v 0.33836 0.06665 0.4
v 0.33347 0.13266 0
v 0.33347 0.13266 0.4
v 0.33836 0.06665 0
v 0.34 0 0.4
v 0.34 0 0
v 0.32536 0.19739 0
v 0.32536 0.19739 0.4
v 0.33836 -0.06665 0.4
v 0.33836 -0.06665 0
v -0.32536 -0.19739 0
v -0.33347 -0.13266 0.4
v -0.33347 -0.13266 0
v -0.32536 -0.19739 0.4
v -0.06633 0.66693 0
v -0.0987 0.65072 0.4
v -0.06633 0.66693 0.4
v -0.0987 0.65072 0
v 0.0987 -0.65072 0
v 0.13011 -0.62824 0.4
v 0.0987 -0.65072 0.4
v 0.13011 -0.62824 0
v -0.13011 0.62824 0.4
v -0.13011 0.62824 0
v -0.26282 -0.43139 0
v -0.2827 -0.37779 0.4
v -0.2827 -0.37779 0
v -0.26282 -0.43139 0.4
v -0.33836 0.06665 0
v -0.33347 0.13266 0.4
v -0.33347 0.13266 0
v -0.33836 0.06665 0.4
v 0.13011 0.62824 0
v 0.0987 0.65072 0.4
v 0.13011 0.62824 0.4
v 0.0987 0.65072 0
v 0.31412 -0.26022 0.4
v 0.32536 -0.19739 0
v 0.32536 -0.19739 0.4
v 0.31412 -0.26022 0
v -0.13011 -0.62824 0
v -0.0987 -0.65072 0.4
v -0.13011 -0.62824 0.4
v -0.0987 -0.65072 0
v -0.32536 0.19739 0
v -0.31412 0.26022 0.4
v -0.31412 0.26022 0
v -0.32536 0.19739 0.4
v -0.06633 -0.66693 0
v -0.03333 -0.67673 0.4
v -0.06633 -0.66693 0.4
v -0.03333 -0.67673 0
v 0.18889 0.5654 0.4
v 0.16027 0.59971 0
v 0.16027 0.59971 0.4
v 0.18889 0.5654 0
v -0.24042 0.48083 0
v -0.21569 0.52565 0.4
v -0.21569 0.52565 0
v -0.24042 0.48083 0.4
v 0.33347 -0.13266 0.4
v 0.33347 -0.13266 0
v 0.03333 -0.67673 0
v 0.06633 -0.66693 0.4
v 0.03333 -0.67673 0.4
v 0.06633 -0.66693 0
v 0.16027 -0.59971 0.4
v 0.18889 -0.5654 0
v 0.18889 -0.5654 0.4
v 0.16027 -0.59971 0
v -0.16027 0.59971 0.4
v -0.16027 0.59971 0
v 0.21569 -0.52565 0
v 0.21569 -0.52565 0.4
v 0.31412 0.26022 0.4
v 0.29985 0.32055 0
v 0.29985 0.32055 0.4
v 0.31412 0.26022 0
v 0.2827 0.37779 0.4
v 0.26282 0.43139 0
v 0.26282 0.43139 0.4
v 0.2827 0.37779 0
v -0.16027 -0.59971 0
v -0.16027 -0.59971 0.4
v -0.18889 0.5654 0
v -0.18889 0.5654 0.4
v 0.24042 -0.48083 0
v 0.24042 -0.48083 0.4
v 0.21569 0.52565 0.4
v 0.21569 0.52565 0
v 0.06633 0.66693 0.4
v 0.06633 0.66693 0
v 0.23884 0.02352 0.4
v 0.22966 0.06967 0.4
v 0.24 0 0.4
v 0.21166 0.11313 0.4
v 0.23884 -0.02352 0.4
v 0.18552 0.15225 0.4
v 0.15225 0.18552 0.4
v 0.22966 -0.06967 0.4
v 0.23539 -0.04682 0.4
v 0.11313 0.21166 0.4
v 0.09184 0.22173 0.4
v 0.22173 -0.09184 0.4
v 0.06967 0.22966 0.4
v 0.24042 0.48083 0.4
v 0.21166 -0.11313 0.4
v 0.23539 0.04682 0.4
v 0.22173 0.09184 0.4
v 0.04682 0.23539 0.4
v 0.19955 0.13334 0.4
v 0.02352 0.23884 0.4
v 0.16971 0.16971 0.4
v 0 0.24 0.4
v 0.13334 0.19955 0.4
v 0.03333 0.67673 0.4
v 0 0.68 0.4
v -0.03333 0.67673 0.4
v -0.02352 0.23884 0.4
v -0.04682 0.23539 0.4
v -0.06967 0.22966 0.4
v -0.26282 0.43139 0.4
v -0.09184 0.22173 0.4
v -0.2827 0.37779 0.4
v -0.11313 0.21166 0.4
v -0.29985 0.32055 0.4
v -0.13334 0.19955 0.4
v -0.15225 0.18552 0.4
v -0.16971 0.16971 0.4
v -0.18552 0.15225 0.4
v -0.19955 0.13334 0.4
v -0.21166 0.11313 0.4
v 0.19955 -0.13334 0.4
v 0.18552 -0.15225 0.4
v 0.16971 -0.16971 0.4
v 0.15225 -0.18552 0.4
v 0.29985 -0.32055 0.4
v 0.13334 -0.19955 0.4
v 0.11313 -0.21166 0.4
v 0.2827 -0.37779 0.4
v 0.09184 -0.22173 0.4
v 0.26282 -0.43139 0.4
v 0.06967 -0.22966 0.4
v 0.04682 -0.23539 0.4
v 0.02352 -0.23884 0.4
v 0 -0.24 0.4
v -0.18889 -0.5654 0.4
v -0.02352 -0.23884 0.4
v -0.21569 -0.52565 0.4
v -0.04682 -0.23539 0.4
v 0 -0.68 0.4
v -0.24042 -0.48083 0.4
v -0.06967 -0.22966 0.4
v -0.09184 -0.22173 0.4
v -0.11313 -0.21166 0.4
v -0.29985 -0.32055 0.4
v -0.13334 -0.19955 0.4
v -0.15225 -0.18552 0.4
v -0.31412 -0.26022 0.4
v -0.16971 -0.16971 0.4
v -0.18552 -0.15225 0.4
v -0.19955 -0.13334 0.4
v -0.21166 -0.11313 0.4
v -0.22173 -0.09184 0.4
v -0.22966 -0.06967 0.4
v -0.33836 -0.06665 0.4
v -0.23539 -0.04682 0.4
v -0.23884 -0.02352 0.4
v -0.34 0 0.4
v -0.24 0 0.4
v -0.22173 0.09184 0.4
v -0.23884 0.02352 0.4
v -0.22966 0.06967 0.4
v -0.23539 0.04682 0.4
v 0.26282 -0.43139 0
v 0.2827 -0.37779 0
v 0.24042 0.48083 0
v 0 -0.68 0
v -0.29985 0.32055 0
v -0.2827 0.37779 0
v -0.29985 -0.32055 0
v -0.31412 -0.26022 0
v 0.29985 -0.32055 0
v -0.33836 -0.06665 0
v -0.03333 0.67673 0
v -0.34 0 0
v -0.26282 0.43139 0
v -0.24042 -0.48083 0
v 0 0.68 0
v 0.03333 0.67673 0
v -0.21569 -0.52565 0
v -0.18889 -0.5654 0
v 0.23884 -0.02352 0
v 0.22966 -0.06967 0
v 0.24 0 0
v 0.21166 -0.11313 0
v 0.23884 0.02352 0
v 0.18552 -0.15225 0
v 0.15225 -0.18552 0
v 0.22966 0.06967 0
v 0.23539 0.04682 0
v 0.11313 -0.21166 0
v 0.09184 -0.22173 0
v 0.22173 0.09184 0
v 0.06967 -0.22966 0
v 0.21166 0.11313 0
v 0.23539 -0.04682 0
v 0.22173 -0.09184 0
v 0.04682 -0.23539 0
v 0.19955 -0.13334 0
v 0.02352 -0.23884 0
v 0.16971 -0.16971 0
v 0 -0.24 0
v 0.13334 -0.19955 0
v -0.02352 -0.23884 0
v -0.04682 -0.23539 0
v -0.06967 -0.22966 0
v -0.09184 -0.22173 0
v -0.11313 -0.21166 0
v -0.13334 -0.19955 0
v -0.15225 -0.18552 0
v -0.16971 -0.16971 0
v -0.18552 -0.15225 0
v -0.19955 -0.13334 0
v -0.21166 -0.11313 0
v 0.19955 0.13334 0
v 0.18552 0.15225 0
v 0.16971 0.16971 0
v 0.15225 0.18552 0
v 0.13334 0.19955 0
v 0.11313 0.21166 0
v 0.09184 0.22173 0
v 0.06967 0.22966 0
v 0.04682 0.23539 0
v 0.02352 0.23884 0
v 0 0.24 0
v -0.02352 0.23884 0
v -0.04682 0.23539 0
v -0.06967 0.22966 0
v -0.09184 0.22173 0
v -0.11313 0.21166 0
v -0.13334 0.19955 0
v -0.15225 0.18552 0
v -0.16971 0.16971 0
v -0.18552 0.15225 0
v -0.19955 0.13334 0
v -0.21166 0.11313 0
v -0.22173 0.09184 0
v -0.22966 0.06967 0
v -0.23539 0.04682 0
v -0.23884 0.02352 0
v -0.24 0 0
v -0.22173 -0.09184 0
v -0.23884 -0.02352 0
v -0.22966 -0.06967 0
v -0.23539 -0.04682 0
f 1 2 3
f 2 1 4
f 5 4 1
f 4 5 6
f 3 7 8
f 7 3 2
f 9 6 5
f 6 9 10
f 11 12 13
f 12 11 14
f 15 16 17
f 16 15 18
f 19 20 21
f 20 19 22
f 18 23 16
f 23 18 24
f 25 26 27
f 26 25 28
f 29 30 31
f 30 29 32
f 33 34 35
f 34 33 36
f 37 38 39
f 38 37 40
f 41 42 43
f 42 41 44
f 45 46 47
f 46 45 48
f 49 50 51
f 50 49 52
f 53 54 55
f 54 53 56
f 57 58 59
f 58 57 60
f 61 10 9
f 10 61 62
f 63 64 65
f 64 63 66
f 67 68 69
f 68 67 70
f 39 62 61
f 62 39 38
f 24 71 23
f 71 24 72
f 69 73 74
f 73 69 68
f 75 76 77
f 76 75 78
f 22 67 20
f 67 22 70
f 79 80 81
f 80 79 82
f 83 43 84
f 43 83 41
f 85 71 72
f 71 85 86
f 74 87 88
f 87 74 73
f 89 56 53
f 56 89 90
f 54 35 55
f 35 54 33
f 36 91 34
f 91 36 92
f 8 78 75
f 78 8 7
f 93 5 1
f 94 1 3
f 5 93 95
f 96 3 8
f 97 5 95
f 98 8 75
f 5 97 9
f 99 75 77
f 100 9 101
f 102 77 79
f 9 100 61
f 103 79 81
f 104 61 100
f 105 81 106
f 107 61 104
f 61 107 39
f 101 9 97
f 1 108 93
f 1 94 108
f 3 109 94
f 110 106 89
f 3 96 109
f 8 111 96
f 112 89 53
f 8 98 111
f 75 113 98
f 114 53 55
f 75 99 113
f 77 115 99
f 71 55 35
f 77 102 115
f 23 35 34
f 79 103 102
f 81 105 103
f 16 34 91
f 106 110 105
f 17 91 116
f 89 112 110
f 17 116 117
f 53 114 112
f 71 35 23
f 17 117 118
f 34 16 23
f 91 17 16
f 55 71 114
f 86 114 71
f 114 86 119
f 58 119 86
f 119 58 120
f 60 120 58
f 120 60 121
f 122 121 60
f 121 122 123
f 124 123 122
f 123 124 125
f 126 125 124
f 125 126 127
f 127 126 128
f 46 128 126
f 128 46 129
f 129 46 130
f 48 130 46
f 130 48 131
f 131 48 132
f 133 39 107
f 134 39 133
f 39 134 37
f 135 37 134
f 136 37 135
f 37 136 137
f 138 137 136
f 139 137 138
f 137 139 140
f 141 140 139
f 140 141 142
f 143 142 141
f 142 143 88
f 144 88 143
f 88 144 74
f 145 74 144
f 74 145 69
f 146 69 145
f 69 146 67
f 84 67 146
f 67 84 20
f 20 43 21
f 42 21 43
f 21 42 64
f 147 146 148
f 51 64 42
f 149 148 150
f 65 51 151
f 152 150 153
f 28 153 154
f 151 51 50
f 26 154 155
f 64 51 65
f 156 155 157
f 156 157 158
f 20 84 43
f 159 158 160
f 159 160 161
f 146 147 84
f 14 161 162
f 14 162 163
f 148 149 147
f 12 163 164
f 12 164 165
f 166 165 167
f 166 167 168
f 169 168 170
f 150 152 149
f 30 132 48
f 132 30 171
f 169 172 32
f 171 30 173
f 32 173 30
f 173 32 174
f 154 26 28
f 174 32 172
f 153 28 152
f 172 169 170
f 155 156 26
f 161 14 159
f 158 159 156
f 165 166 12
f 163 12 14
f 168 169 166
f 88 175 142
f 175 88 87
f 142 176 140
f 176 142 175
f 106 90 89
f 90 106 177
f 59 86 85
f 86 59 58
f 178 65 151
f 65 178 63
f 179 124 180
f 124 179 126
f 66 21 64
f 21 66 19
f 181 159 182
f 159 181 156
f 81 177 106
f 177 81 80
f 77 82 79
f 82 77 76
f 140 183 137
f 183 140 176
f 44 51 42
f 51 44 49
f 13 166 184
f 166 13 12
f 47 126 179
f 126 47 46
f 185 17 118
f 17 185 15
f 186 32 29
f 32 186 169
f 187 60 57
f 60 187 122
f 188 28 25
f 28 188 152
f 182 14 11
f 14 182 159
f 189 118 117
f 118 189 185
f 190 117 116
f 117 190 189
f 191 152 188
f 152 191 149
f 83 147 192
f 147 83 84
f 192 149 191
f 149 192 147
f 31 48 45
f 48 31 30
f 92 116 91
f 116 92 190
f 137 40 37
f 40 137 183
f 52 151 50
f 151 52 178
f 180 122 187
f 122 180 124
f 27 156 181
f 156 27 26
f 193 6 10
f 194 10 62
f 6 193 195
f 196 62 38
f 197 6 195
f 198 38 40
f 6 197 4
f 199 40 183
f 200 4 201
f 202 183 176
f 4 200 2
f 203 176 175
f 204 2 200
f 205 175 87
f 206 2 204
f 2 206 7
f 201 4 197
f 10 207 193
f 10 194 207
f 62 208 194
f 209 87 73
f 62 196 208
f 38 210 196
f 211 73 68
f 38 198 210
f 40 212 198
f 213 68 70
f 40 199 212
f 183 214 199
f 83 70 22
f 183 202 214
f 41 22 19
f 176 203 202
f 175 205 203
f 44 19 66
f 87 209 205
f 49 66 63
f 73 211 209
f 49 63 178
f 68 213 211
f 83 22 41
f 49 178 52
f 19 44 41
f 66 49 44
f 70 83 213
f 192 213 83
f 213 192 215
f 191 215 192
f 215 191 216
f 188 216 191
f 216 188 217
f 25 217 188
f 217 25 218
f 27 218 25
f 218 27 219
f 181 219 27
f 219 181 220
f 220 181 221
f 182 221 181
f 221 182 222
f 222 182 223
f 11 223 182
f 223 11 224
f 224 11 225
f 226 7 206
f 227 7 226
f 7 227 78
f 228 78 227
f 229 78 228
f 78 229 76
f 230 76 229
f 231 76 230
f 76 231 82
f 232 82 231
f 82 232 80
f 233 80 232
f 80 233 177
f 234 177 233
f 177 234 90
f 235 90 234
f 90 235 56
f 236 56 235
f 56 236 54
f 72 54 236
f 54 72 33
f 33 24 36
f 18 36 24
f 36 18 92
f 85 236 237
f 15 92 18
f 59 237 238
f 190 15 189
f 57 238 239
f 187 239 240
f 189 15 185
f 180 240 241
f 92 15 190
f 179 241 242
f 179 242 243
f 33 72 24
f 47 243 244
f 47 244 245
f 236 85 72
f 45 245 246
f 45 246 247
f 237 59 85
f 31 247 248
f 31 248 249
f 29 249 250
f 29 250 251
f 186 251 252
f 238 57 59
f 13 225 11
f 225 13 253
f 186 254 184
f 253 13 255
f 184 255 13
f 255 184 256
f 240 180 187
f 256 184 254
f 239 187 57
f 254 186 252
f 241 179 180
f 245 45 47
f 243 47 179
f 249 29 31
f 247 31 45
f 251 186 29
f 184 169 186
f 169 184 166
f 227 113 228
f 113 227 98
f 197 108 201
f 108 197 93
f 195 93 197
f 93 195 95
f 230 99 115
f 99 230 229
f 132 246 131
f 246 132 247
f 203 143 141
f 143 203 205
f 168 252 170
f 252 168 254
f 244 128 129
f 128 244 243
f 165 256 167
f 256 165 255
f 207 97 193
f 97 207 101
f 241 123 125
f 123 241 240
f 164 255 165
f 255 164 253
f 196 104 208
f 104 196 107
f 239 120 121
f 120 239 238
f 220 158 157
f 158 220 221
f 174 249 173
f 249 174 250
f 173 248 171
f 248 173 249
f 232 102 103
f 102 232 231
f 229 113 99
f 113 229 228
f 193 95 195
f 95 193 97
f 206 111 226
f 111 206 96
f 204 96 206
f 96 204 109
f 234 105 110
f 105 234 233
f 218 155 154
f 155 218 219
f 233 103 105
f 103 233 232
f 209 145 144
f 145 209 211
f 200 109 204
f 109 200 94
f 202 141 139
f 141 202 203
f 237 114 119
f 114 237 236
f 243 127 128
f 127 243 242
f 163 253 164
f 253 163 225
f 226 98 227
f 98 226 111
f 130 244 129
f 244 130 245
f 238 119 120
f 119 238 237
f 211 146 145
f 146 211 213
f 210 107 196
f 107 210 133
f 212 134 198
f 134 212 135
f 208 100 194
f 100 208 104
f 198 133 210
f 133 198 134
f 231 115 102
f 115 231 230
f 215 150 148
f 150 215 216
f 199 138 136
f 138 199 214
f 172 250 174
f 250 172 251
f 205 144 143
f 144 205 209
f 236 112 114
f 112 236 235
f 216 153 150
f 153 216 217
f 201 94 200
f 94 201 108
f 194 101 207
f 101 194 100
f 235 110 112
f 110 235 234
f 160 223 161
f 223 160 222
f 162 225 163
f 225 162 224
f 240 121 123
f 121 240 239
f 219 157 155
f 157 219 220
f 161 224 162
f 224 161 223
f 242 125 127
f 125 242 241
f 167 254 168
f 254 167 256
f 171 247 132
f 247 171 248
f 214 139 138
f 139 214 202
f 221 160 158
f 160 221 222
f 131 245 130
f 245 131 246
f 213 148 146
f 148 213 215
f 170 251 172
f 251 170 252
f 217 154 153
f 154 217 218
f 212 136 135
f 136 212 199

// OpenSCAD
// file: dodecahedroid_config.scad
// Default settings for ATX and ITX form factor builds

// 1 unit is 1 cm

// Panel index
// 0 Back upper left
// 1 Front
// 2 Back upper right
// 3 Side right
// 4 Bottom right (right back wheel)
// 5 Back right
// 6 Back (power port)
// 7 Back left
// 8 Back middle upper
// 9 Front lower (front wheel)
// 10 Side left
// 11 Bottom left (left back wheel)

// Positions/rotations of the panels calculated with Python
pos = [[0.5854101777076721, 0.0, 0.9472135305404663],
[1.1920929132713809e-08, 0.9472135305404663, 0.5854102373123169],
[-0.5854101777076721, 1.1920929132713809e-08, 0.9472135305404663],
[-0.9472135305404663, 0.5854101777076721, 0.0],
[-0.5854102373123169, 1.1920929132713809e-08, -0.9472135305404663],
[-0.9472135305404663, -0.5854101777076721, -1.1920929132713809e-08],
[0.0, -0.9472135305404663, -0.5854101777076721],
[0.9472135305404663, -0.5854102373123169, -1.1920929132713809e-08],
[1.1920929132713809e-08, -0.9472135305404663, 0.5854101777076721],
[0.0, 0.9472135305404663, -0.5854101777076721],
[0.9472135305404663, 0.5854101777076721, 0.0],
[0.5854101777076721, 0.0, -0.9472135305404663]];

rots = [
[0.0, -148.28252619340458, 0.0],
[58.28252330005587, -179.99999883326447, 0.0],
[6.133892063149527e-07, 148.28252619340458, 0.0],
[31.71747270143459, 90.0, 0.0],
[6.133892063149527e-07, 31.717476711648423, 0.0],
[-31.71747270143459, 89.99999927891773, 0.0],
[-58.28252330005587, -0.0, -0.0],
[-31.717476716119066, -89.99999927891773, -0.0],
[-58.28252330005587, -179.99999883326436, 0.0],
[58.28252330005587, -0.0, -0.0],
[31.71747270143459, -90.0, 0.0],
[0.0, -31.717473806595436, -0.0],
];

// These rotations align the panel edges
panel_rots = [36, -36*4.5, 0, 18 - 72*2, 180+36, -18, 18, -18, 18+72, 18+72, 18, -36];
//panel_rots = [36, -36*4.5, 0, 18, 180, -18, 18, -18, 18, 18+36, 18, 0];

// 0 is Nose Cone
// 1 is Bridge
// 2 is Life Support
// 3 is Cradle
face_groups = [0, 1, 0, 1, 3, 2, 2, 2, 0, 3, 1, 3];

// Face group palettes
pastel_gothic = ["#DB9366", "#FFBAEC", "#ADEAE6", "#93DB65"];

// 0 is Mortality Escape Pod
// 1 is Mothership
meta_groups = [0, 0, 0, 0, 1, 1, 1, 1, 0, 1, 0, 1];

unique_panel_colors = [
    "#be4a2f", "#d77643", "#ead4aa", "#e4a672", "#b86f50", "#733e39",
    "#3e2731", "#a22633", "#e43b44", "#f77622", "#feae34", "#fee761"
];

// Indicate whether standard ventilation should be cutout on a panel
vents = [true, true, true, true, true, true, true, true, true, true, true, true];

// In ROBOT MODE, the wheels are configured into a triwheel design
// Settings to configure robotic aspects and motherboard size
robot_mode = true;


build_config = "PROTOTYPE";

dihedral = 116.565;

// Circumradius of pentagon
// ATX
panel_radius = 16;
// ITX
//panel_radius=14;

panel_thickness = .3;

panel_Z = panel_thickness/tan(116.565/2);
// inner_panel_radius = panel_radius - panel_Z;
// I'm not sure if this is correct, I just guessed
inner_panel_radius = panel_radius-(panel_thickness-panel_Z)*2;

// Hex vent

// Production
//cell_size = 0.3;
//wall_thickness = 0.1;

// Small
// cell_size = 0.4;
// wall_thickness = 0.2;

// Large
cell_size = 0.6;
wall_thickness = .3;

// Iterate
//cell_size = 10.0;
//wall_thickness = .01;

// The distance from a corner to the center of an M3 hole (for connectors)
// the radius is centered at the base corner
pcorner_dist = 3;
m3_distance_from_panel_corner = [pcorner_dist, pcorner_dist, pcorner_dist , pcorner_dist , pcorner_dist ];

// The space between the M3 screws to secure power variant vertex connector
// (Bottom of Cradle panels)
power_secure_spacing = 4.0;
// Space between M3 screws on panel corners/connector notches with 2 screws
// Front mothership and fan
// (currently this should be <= 1.8, otherwise it will not extend to the inner surface of a vertex notch
standard_secure_spacing = 1.3;

// The distance from the panel edge, which is not vented
border_edge = 1.0;

// https://en.wikipedia.org/wiki/Pentagon
eq_panel_edge_length = sqrt((5-sqrt(5))/2);
panel_edge_length = panel_radius*eq_panel_edge_length;

eq_panel_height = sqrt(5 + 2*sqrt(5))/2;
panel_height = eq_panel_height * panel_edge_length;

inner_panel_edge_length = inner_panel_radius*eq_panel_edge_length;
inner_panel_height = eq_panel_height*inner_panel_edge_length;

eq_height_vertical = sin(dihedral/2);
height_vertical = eq_height_vertical * panel_height;

height_stack = height_vertical*2;

tetra_a = 37.3774;
// 20.9052
// Tetrahedron C
magic_angle = atan(panel_edge_length/height_stack);

RAM = 128; // ;)

// Mounting bracket for wheels
bracket_height = 2.8;
bracket_start = 1.0;
bracket_width = 2.0;
insert_width = 5.0;
insert_partial = insert_width-bracket_width;

// Wheel Mount Panel Insert Offset;
// ie how far from bottom of panel to difference the wheel mount insert
wmb_pio = 7;

interior_scale = (25.9789/1.40126);
to_wheel_mount_surface = -16.9118;

brass_insert_radius = 4.8/2/10;
brass_insert_height = 4/10;

screw_clearance = 0.03;
m3_rad = 0.15+screw_clearance;

module BrassInsert()
{
    $fn=64;
    cylinder(0.4, (0.5-0.02)/2, (0.5-0.02)/2);
}

module BrassInsertHolder()
{
    $fn=64;
    cylinder(0.4, 0.5, 0.5);
}
// main file
include <dodecahedroid_config.scad>

// Pieces to screw onto the ends of screw sliders to secure peach core
// This can be soft to accomodate variation

// So rather than a brass insert it should use a nut catchment

// Alternatively: pour a silicon mold of the core

difference()
{
$fn=64;
scale([1, 2, 1]) cylinder(0.4, (0.7-0.02)/2, (0.7-0.02)/2);
//translate([-0.35, -0.35, 0]) cube([0.7, 0.7, 0.4], center=false);
BrassInsert();
}
